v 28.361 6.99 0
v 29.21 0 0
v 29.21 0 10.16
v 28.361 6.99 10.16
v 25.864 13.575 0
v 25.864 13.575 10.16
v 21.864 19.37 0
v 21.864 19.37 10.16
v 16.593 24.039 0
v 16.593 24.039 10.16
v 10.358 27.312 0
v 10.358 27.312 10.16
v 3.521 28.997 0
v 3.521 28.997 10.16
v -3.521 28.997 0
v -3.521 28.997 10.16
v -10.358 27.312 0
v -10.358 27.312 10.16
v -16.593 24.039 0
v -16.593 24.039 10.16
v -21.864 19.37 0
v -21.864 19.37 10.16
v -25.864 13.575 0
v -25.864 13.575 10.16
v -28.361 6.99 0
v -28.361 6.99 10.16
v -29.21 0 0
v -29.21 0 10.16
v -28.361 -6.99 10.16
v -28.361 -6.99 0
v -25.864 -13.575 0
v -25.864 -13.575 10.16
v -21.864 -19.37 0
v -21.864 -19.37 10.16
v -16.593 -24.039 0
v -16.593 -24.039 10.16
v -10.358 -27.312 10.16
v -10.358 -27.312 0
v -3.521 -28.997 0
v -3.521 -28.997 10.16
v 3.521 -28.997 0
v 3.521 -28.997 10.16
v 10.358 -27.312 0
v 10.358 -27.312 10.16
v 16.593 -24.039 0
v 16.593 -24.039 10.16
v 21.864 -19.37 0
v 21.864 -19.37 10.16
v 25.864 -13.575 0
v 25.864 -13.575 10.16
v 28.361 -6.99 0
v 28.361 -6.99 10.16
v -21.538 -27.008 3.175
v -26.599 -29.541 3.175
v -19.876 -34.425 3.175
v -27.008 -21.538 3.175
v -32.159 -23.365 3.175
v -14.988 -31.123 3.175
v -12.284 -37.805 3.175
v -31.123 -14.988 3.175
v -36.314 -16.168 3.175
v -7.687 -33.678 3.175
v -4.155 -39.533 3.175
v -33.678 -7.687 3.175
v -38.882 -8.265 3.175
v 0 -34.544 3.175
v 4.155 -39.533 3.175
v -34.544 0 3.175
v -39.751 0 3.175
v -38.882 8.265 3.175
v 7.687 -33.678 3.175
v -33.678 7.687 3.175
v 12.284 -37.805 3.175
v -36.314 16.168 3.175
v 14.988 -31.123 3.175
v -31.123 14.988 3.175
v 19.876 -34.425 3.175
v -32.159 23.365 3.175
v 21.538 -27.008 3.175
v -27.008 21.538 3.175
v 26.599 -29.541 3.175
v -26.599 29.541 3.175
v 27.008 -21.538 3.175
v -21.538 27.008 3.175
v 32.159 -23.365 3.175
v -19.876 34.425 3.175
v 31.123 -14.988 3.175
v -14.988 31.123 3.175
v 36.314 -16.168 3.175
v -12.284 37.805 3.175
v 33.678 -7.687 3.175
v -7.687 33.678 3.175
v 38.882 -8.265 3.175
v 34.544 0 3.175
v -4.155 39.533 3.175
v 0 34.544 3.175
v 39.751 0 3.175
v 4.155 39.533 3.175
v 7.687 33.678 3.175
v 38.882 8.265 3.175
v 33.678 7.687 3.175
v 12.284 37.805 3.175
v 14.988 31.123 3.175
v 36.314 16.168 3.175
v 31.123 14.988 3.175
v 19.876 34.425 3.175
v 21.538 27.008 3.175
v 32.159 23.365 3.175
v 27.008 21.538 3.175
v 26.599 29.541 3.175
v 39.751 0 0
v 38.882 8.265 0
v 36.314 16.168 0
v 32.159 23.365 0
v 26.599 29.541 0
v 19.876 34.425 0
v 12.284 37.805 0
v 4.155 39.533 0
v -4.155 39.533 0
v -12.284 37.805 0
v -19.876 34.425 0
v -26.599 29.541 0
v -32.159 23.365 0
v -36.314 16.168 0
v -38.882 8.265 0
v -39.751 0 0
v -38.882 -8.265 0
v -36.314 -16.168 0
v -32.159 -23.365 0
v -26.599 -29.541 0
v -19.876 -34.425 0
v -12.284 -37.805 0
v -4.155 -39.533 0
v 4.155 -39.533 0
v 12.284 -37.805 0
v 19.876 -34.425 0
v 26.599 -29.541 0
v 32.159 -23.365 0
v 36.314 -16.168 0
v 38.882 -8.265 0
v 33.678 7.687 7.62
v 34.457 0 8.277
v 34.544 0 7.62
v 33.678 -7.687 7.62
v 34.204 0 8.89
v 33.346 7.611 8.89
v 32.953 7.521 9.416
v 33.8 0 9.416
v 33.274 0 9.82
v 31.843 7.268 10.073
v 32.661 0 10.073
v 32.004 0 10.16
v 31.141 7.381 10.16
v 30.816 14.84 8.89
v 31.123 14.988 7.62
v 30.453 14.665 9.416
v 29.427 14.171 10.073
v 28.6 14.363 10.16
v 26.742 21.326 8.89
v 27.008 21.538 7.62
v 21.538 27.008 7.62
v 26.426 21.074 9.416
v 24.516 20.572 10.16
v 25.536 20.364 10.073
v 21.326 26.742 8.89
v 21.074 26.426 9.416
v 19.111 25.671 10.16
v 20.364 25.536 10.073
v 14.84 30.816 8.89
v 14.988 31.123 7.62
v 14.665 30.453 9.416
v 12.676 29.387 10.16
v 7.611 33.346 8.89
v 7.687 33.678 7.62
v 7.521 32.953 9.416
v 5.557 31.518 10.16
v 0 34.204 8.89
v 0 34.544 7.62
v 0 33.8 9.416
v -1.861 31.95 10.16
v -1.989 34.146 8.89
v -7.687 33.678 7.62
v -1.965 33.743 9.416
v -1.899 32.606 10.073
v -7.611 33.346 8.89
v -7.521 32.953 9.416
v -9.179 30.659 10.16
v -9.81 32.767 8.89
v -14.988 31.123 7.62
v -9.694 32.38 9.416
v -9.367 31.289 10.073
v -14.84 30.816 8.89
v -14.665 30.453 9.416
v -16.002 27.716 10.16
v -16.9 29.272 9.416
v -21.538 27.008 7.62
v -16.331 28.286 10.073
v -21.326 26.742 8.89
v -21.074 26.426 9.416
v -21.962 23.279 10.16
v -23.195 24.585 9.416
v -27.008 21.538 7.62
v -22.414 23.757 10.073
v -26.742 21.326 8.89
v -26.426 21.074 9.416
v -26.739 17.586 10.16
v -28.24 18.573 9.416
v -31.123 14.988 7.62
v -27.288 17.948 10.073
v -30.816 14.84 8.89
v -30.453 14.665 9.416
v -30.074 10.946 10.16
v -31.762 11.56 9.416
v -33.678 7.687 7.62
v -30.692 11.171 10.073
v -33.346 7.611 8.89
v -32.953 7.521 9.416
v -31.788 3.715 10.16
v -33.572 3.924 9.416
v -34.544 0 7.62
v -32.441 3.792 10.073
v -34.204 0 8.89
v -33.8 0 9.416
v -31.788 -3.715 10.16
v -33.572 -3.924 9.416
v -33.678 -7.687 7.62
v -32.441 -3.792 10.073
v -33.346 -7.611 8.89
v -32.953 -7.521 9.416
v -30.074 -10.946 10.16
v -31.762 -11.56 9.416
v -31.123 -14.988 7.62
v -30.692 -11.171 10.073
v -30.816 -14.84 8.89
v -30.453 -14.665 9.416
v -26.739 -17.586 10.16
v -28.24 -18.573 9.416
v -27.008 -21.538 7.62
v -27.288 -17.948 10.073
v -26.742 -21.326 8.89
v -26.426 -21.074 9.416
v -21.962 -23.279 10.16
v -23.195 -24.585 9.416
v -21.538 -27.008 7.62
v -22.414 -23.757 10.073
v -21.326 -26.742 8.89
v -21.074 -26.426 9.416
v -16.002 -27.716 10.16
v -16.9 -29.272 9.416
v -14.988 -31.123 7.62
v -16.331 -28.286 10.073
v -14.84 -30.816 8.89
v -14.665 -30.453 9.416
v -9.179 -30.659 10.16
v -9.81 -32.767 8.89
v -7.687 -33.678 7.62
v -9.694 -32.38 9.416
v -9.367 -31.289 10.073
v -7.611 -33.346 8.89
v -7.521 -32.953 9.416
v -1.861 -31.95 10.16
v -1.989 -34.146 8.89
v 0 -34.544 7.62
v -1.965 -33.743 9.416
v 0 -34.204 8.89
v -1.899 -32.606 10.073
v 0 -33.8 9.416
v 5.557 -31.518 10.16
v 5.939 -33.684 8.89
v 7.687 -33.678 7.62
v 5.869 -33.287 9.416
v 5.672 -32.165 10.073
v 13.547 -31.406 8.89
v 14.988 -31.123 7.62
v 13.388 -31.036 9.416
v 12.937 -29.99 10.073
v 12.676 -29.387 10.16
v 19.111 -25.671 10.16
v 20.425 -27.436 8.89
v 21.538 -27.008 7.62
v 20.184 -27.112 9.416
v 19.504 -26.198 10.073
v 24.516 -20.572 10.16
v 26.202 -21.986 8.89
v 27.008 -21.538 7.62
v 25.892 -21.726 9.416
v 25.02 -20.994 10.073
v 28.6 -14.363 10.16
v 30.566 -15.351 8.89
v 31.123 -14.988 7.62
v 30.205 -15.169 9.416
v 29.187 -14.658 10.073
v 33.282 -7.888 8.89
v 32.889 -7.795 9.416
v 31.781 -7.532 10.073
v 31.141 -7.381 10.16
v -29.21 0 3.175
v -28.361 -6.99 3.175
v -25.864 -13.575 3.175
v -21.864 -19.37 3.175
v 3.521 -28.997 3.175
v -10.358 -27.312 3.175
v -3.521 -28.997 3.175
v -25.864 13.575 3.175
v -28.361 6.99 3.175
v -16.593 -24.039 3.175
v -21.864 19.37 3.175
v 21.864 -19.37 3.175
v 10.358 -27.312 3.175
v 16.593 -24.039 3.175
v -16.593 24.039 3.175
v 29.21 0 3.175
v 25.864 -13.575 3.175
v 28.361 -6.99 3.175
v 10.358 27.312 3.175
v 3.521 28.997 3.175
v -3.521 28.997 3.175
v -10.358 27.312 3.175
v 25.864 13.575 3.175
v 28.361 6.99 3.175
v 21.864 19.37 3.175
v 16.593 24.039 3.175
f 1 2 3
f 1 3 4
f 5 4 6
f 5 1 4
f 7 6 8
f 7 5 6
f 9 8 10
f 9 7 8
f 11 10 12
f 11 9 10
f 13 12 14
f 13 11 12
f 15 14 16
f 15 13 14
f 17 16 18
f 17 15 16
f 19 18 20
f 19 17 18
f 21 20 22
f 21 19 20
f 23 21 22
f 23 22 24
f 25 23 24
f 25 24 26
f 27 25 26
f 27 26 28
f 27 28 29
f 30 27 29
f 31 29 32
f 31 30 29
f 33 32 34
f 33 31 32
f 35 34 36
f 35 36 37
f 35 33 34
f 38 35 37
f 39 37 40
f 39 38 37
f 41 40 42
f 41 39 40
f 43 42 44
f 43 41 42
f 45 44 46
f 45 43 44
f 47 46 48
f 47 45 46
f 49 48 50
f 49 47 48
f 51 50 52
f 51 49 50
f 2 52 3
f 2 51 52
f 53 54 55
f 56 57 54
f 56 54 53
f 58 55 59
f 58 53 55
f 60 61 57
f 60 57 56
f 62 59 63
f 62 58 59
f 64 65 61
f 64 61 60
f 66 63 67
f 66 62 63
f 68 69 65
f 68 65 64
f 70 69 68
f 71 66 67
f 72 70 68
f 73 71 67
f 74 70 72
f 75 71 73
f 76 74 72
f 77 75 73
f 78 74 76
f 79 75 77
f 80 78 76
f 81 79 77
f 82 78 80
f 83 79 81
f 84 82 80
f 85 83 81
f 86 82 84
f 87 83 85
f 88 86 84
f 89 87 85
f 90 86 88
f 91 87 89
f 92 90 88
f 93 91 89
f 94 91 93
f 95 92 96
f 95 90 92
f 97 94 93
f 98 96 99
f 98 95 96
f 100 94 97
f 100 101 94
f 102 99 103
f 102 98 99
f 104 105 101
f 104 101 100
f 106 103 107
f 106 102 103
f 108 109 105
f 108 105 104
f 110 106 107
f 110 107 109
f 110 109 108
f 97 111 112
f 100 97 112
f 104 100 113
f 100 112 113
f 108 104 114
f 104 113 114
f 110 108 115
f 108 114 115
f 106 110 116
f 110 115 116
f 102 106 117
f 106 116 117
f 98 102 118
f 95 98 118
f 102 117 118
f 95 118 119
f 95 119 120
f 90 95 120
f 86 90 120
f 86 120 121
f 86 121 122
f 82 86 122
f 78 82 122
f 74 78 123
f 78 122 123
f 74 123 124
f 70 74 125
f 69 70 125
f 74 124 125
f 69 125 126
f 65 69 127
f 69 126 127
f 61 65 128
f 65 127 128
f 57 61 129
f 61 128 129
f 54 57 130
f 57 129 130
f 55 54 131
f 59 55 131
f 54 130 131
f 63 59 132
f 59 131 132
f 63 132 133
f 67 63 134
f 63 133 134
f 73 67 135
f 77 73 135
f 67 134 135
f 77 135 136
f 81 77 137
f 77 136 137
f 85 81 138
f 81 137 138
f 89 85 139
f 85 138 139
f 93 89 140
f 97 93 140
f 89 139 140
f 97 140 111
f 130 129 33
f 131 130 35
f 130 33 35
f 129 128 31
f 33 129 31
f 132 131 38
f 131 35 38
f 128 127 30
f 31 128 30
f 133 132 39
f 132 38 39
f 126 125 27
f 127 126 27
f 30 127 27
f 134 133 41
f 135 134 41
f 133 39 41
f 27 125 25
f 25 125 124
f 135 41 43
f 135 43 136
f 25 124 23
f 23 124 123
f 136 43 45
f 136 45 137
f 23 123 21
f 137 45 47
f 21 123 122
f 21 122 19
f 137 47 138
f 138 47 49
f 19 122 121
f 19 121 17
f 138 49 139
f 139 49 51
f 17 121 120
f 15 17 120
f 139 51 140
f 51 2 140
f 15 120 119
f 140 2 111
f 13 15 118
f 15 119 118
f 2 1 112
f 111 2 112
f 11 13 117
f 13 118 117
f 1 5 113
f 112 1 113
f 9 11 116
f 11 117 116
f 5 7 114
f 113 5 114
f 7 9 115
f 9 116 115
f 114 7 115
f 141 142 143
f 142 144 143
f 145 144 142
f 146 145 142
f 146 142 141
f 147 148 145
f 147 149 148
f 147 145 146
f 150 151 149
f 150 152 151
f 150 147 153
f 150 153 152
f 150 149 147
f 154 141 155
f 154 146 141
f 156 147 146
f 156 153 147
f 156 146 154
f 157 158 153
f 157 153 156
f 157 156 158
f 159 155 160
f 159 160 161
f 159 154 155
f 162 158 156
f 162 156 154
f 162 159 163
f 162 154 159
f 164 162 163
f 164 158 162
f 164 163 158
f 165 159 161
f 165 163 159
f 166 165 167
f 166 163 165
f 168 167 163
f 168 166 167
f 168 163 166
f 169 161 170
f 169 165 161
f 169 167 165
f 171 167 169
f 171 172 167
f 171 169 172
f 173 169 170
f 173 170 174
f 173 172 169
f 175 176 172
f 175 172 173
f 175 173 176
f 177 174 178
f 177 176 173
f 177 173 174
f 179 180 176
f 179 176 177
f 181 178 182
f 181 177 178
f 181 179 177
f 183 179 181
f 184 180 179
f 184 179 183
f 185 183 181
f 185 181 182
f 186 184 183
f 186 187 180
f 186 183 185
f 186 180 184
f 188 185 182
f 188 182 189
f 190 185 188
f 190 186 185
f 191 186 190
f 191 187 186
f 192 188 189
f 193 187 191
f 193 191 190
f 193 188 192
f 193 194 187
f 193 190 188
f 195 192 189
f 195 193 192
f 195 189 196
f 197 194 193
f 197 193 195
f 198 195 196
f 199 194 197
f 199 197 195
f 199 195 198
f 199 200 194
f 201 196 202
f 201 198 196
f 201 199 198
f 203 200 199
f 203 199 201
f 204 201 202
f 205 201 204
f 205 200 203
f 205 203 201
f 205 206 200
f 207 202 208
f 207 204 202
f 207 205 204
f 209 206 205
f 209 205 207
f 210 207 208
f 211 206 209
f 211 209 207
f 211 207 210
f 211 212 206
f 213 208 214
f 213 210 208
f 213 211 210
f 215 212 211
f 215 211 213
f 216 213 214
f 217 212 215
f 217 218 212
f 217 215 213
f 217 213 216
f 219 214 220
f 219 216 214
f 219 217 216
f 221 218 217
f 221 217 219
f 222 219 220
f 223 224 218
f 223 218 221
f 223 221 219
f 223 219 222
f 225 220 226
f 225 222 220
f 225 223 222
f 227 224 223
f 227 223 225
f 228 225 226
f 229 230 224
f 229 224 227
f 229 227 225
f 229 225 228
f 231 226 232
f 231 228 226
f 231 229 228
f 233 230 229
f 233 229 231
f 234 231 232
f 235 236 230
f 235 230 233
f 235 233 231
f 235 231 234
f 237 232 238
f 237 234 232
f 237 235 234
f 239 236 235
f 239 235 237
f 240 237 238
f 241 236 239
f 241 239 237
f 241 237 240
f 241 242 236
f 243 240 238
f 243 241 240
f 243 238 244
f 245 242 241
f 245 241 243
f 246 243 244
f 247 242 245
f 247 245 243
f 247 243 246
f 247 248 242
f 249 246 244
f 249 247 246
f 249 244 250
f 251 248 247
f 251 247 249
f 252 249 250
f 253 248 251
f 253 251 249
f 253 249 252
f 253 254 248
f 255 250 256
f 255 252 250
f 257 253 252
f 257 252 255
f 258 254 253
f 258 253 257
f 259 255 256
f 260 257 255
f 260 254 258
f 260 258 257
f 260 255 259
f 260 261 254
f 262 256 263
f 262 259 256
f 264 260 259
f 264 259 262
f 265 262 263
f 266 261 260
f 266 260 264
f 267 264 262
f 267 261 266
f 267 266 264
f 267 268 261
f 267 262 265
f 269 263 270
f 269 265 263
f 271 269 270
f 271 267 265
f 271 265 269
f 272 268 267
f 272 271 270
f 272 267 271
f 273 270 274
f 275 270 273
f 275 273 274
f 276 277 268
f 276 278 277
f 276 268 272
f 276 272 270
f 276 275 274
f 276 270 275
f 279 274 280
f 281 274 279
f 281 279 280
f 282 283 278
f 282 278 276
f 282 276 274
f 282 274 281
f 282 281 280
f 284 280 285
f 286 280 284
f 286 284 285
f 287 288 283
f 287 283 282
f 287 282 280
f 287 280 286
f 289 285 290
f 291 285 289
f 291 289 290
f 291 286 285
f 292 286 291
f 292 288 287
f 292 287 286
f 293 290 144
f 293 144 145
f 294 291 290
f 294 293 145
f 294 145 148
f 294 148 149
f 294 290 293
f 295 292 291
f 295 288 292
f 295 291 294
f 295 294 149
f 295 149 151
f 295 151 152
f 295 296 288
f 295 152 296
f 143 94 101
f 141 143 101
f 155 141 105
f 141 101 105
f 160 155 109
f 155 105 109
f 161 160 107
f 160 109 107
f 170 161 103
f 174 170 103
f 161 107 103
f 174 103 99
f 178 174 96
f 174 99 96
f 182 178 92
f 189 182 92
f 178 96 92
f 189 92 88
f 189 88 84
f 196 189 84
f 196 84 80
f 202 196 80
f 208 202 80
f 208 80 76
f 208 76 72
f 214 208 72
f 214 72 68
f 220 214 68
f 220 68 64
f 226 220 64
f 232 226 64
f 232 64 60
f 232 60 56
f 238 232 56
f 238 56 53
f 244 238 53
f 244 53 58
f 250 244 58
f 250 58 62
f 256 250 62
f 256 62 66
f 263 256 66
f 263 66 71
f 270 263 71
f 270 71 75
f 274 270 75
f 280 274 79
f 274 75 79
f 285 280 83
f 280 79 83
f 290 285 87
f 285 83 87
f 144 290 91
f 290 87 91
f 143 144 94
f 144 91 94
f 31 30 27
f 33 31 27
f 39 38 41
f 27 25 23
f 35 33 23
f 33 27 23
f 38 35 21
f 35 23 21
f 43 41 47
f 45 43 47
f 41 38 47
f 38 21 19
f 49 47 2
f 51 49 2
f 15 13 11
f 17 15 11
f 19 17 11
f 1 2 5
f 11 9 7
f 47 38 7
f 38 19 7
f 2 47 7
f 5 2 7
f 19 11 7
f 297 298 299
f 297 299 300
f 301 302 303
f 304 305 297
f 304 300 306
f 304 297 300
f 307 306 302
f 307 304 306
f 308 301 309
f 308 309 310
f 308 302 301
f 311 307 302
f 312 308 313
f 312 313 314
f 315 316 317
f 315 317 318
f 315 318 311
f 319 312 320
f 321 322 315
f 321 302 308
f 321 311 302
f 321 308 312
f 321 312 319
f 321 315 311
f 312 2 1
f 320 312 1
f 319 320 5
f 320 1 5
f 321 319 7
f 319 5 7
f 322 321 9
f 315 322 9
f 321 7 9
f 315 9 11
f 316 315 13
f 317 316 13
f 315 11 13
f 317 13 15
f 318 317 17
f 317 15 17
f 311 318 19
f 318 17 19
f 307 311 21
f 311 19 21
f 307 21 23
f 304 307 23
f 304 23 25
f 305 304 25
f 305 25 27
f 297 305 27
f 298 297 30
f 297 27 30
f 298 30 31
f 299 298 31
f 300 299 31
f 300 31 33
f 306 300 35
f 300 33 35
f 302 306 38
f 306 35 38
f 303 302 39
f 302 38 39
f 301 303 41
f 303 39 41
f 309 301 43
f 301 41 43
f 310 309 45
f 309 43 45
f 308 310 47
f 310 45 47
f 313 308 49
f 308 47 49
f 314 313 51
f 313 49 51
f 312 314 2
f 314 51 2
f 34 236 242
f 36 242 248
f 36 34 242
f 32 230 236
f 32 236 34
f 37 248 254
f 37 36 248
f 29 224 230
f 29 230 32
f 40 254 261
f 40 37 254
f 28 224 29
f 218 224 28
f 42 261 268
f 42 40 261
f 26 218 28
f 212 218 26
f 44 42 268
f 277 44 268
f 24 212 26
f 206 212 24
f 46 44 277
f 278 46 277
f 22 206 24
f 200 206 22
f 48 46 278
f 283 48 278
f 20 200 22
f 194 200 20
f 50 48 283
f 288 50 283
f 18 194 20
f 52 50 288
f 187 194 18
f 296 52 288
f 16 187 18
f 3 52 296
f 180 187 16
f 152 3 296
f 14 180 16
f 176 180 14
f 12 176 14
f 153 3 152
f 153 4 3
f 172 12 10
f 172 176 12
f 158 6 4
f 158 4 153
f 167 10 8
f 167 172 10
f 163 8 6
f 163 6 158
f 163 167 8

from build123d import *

# Parameters (mm, degrees)
F0_R     = 39.751
F0_R_2   = 34.544
F1_DEPTH = 3.175
F0_R_3   = 29.21
F2_DEPTH = 10.16
F3_R     = 2.54


with BuildPart() as f1:
    # F0 (on Top) → F1 (new body)
    with BuildSketch(Plane.XY):
        Circle(F0_R)
        Circle(F0_R_2, mode=Mode.SUBTRACT)
    extrude(amount=F1_DEPTH)

    # F0 (on Top) → F2 (join)
    with BuildSketch(Plane.XY):
        Circle(F0_R_2)
        Circle(F0_R_3, mode=Mode.SUBTRACT)
    extrude(amount=F2_DEPTH)

    # F3
    f3_edges = [f1.edges().sort_by_distance(p)[0] for p in [
        (-34.544, 0, 10.16),
    ]]
    fillet(f3_edges, radius=F3_R)


with BuildPart() as f1b:
    # F0 (on Top) → F1, piece 2 (new body)
    with BuildSketch(Plane.XY):
        Circle(F0_R_3)
    extrude(amount=F1_DEPTH)


solid = Compound([f1.part, f1b.part])
